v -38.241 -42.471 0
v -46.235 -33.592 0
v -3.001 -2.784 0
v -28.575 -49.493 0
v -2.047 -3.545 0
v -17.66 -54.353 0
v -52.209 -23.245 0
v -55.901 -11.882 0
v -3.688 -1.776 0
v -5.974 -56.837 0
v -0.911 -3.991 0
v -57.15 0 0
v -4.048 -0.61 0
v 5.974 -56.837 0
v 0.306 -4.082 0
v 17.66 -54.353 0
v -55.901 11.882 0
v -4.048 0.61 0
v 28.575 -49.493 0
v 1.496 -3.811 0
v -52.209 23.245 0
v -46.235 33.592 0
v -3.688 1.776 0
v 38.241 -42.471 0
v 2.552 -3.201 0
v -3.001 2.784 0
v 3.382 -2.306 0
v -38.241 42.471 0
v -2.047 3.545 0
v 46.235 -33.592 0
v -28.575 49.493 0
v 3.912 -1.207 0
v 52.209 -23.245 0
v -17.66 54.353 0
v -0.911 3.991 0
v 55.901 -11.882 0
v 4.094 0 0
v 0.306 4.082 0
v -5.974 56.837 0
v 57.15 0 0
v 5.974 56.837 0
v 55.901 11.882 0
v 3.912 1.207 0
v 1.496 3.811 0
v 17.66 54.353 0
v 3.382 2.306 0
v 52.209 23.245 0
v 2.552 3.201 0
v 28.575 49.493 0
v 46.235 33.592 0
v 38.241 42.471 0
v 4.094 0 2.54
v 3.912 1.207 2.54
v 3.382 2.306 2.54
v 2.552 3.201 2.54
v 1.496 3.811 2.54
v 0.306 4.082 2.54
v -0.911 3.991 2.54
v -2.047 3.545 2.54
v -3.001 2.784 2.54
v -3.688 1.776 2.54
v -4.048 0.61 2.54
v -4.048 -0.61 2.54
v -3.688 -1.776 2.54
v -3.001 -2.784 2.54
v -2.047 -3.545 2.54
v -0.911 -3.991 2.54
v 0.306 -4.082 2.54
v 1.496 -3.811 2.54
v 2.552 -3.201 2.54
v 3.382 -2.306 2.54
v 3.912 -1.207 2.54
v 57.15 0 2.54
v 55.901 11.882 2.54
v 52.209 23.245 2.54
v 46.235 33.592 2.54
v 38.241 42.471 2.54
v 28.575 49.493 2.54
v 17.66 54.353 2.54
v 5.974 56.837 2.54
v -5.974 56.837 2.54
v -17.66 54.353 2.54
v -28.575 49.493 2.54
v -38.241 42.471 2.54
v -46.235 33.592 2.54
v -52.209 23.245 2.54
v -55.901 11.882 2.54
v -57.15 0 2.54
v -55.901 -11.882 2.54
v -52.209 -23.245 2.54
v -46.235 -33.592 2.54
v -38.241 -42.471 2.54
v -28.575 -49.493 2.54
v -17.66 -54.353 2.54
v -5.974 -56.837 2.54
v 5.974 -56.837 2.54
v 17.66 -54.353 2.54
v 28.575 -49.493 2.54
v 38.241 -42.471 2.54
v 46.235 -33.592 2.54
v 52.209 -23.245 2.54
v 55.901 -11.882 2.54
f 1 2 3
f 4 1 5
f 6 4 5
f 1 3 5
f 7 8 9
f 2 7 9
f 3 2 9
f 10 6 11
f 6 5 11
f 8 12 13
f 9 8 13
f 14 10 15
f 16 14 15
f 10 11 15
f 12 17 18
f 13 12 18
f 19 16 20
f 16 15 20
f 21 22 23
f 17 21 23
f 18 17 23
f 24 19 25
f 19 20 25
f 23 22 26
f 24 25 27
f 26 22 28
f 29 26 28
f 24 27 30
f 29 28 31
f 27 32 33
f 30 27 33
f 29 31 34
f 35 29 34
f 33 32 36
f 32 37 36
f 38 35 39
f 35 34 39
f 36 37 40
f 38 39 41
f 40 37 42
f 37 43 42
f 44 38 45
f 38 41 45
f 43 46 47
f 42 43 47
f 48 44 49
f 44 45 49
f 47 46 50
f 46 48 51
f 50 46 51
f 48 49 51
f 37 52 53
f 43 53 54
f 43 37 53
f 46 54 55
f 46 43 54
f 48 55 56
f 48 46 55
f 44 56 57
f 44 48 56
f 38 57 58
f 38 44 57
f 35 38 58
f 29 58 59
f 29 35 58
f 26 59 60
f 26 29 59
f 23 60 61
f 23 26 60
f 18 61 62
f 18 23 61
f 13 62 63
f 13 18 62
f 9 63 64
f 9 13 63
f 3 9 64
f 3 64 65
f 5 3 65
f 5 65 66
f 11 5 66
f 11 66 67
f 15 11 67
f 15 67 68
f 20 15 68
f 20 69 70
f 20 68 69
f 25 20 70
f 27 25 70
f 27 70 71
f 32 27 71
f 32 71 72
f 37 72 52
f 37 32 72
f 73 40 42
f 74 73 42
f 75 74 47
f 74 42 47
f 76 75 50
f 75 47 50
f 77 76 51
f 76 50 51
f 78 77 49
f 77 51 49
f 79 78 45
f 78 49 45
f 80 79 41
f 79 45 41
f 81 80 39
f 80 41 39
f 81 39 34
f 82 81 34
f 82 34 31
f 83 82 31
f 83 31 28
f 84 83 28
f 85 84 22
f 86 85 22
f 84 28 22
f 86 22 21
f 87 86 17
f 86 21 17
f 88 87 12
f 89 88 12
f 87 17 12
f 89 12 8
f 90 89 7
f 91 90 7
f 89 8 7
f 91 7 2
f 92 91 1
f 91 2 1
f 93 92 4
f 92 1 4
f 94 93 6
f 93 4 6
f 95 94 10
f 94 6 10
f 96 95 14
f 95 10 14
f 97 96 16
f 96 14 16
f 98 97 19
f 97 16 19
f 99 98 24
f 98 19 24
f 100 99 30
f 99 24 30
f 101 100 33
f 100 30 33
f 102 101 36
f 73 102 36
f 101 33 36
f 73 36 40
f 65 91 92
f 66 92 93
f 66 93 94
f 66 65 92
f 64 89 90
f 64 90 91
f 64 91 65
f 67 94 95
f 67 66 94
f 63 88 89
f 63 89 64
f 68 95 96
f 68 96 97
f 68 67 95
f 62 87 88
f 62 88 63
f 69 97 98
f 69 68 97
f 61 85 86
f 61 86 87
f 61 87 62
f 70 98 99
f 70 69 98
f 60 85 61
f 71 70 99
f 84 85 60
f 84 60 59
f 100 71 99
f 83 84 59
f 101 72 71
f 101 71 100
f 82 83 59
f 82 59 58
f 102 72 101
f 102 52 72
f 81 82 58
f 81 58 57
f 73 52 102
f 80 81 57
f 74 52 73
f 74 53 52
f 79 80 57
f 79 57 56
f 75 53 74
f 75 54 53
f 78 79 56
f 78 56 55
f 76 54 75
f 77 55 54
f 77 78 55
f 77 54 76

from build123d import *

# Parameters (mm, degrees)
F0_R     = 57.15
F1_DEPTH = 2.54
F2_R     = 4.09365
F3_DEPTH = 25.4
F4_DEPTH = 25.4


with BuildPart() as f1:
    # F0 (on Top) → F1 (new body)
    with BuildSketch(Plane.XY):
        Circle(F0_R)
    extrude(amount=F1_DEPTH)

    # F2 (on Top) → F3 (cut)
    with BuildSketch(Plane.XY):
        Circle(F2_R)
    extrude(amount=-F3_DEPTH, mode=Mode.SUBTRACT)

    # F2 (on Top) → F4 (cut)
    with BuildSketch(Plane.XY):
        Circle(F2_R)
    extrude(amount=F4_DEPTH, mode=Mode.SUBTRACT)


solid = f1.part
